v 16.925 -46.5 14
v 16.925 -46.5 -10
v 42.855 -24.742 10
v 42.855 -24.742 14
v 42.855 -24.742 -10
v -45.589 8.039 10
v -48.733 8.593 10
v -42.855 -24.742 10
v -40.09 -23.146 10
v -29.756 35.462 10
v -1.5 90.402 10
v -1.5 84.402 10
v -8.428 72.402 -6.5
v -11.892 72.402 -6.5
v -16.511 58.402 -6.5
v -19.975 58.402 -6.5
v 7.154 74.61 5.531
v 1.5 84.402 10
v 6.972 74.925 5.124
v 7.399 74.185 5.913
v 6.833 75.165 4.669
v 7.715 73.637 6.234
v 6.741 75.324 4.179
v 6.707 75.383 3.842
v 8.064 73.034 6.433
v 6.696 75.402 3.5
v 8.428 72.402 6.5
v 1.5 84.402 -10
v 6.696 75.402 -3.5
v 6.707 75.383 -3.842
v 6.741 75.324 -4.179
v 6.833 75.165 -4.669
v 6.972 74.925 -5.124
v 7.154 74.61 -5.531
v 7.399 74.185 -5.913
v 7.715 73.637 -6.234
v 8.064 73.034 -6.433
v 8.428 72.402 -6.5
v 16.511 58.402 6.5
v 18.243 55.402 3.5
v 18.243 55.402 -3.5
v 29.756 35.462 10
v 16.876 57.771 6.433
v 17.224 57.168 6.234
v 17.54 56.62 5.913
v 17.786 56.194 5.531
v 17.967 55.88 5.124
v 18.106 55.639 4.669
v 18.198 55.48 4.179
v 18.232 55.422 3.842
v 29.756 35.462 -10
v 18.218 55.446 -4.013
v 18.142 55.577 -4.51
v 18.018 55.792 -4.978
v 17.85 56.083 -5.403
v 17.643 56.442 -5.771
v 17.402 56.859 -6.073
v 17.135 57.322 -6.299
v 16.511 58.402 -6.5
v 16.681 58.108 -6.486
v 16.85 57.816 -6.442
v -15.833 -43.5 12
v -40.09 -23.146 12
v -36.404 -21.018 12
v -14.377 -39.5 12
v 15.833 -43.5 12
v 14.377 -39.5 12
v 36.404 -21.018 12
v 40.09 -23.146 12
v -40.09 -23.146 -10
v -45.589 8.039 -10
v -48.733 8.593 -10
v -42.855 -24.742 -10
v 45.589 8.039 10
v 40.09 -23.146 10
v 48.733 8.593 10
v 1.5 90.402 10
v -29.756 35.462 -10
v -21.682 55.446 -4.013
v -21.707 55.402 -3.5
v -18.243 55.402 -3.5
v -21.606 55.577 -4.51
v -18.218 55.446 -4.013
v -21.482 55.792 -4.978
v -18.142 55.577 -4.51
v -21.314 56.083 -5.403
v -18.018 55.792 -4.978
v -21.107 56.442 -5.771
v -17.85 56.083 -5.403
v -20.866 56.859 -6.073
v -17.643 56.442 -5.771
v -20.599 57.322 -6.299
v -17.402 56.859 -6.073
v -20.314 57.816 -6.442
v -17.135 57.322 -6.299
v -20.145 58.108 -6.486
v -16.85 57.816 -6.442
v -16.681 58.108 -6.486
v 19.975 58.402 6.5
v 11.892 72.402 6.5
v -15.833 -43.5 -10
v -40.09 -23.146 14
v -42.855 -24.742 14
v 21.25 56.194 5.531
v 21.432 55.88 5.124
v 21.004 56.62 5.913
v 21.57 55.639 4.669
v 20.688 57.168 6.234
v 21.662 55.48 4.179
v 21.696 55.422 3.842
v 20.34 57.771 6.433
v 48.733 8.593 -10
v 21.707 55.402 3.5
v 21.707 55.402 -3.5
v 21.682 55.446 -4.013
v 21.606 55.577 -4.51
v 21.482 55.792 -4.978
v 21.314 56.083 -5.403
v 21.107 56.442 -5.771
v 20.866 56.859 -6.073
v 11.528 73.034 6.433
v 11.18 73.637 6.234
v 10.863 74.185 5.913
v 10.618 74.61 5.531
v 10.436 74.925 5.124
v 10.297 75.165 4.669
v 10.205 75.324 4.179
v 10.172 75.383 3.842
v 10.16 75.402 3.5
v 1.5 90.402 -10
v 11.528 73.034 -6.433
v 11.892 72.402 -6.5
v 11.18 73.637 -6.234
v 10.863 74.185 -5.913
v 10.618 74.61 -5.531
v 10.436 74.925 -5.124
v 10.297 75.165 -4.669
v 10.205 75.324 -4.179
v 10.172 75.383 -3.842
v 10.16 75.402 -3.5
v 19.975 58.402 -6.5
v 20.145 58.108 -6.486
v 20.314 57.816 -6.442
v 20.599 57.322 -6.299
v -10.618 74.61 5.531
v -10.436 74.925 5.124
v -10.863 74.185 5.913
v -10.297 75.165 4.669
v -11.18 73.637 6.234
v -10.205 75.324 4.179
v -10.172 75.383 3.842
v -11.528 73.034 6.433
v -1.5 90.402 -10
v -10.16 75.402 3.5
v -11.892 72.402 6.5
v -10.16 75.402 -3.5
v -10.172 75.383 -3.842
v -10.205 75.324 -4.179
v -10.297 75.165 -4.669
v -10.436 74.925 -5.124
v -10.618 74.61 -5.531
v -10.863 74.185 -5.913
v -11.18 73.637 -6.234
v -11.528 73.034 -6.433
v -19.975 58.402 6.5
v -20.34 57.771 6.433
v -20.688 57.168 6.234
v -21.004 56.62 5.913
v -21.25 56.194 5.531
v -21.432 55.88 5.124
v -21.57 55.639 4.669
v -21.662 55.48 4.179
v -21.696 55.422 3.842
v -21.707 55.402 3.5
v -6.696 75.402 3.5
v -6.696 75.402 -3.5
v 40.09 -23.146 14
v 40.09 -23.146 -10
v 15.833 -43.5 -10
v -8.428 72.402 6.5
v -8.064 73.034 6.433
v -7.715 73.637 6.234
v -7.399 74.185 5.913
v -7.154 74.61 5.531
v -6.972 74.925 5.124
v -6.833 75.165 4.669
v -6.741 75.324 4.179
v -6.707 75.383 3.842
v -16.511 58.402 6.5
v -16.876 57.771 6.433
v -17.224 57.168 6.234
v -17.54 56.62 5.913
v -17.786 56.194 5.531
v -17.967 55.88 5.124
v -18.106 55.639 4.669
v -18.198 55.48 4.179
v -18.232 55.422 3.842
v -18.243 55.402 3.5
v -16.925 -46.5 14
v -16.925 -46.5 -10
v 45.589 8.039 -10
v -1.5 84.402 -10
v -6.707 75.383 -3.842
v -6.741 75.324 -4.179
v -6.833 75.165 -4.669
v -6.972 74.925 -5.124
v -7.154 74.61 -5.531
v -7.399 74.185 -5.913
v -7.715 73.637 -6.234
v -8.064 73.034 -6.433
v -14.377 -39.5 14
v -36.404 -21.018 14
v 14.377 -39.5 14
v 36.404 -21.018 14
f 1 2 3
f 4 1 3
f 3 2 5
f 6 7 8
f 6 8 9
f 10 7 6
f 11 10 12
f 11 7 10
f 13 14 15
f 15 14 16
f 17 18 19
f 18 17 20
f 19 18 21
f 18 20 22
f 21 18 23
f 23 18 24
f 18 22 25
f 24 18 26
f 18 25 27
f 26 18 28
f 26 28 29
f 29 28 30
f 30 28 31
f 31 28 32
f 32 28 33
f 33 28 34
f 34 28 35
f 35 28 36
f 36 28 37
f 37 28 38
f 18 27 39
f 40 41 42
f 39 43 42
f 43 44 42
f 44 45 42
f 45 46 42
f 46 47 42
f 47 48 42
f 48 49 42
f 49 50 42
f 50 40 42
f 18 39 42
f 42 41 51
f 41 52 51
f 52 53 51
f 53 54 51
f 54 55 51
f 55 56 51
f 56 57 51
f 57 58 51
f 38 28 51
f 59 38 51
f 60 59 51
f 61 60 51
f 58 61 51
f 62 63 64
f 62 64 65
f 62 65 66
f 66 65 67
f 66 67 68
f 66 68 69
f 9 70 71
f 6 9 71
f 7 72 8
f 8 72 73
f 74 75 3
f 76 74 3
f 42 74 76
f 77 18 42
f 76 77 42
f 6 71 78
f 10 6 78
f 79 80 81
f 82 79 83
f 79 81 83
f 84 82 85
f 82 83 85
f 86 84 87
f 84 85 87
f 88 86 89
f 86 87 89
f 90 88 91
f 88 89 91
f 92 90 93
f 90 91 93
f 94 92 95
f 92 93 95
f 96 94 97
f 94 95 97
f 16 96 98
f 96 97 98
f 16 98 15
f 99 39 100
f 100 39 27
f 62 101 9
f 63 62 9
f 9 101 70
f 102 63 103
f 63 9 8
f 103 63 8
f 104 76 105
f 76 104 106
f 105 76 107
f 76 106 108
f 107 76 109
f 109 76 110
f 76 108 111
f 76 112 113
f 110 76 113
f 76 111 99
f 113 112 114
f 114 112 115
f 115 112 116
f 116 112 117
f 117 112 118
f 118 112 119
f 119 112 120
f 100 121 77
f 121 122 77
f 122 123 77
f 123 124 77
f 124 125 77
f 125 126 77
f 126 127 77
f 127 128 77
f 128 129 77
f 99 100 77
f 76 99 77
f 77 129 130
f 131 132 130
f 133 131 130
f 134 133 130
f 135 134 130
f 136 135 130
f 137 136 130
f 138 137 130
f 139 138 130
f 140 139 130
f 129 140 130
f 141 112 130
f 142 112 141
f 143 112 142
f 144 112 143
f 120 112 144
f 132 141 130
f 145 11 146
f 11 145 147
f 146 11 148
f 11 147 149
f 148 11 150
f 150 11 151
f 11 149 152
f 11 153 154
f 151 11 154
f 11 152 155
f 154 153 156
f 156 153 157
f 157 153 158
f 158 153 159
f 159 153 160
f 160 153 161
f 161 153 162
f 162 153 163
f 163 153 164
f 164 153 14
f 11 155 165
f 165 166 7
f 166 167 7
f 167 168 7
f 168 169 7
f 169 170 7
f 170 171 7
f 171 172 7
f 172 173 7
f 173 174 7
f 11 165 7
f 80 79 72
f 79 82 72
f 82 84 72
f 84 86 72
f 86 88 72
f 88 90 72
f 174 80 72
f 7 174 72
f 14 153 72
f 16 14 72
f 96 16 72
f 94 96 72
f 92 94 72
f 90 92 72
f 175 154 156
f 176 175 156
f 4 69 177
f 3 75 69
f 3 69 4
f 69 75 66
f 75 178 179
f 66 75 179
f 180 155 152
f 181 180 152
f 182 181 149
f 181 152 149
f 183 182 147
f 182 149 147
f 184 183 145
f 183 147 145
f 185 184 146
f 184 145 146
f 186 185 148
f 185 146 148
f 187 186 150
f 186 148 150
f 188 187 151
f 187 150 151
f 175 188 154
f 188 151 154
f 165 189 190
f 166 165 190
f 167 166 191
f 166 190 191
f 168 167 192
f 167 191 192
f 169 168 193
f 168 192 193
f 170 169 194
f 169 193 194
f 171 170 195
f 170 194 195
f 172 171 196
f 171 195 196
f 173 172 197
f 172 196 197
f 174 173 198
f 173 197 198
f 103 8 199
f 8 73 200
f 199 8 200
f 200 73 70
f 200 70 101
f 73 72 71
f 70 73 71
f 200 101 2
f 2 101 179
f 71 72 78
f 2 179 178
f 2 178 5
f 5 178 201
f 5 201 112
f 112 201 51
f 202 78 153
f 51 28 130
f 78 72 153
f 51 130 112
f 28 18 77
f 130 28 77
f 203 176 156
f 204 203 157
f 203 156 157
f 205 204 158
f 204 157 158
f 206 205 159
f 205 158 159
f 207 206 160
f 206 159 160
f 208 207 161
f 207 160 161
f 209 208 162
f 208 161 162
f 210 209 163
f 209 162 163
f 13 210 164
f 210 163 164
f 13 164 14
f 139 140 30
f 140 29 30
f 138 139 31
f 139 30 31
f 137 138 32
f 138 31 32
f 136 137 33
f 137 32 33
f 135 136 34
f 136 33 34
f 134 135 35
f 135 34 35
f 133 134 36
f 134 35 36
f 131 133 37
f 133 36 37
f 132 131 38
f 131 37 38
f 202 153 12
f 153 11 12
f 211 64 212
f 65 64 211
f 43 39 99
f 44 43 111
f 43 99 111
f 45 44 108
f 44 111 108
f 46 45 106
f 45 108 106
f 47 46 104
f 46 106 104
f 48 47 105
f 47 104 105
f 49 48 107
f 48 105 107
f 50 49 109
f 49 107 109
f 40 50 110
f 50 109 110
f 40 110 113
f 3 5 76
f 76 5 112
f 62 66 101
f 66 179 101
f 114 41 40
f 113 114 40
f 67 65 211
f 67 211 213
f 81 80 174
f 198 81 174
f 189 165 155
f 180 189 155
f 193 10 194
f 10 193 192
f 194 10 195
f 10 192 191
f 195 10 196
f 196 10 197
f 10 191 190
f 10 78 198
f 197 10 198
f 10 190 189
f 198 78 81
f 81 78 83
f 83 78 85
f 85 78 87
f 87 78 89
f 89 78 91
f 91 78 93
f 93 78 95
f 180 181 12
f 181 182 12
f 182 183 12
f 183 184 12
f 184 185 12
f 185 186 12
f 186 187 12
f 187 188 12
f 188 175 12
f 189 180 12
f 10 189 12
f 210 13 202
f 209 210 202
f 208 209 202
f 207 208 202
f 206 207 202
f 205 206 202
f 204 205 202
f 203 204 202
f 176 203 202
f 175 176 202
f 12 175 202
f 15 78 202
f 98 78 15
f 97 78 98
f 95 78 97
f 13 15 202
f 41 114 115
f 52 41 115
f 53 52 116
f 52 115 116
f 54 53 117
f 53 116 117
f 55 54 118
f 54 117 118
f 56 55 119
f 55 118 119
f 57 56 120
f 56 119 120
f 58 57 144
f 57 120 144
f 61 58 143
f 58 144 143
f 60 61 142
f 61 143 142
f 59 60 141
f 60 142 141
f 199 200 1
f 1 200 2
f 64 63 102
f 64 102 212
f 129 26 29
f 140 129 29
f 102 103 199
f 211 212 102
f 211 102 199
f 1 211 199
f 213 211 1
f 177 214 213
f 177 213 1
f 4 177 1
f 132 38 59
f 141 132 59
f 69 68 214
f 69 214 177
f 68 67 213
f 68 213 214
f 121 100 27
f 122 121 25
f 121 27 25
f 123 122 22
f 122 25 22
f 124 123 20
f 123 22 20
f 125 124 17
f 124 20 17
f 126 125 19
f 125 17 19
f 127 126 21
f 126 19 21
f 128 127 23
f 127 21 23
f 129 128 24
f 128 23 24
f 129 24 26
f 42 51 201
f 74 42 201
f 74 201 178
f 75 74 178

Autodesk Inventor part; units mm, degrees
ref_plane "YZ Plane" through (0, 0, 0) normal (1, 0, 0) x (0, 1, 0)
ref_plane "XZ Plane" through (0, 0, 0) normal (0, 1, 0) x (-1, 0, 0)
ref_plane "XY Plane" through (0, 0, 0) normal (0, 0, 1) x (1, 0, 0)
sketch "Sketch1" plane through (0, 0, 0) normal (0, 0, 1) x (1, 0, 0)
  line L0 (29.7558, 35.4616) -> (45.5886, 8.0385)
  line L1 (45.5886, 8.0385) -> (40.0899, -23.1459)
  line L2 (40.0899, -23.1459) -> (15.8328, -43.5001)
  line L3 (15.8328, -43.5001) -> (-15.8328, -43.5001)
  line L4 (-15.8328, -43.5001) -> (-40.0899, -23.1459)
  line L5 (-40.0899, -23.1459) -> (-45.5886, 8.0385)
  line L6 (-45.5886, 8.0385) -> (-29.7558, 35.4616)
  line L7 (-29.7558, 35.4616) -> (0, 46.2919)
  line L8 (0, 46.2919) -> (29.7558, 35.4616)
  line L9 (-29.7558, 35.4616) -> (0, 87.0003)
  line L10 (0, 87.0003) -> (29.7558, 35.4616)
  line L11 (0, 93.0003) -> (-48.7326, 8.5929)
  line L12 (-48.7326, 8.5929) -> (-42.8548, -24.7422)
  line L13 (-42.8548, -24.7422) -> (-16.9247, -46.5001)
  line L14 (-16.9247, -46.5001) -> (16.9247, -46.5001)
  line L15 (16.9247, -46.5001) -> (42.8548, -24.7422)
  line L16 (42.8548, -24.7422) -> (48.7326, 8.5929)
  line L17 (48.7326, 8.5929) -> (0, 93.0003)
  line L18 (0, -74.4002) -> (0, 120.9003) projected
  point P0 (0, 0)
  point P1 (0, 0)
  dimension "d0" = 89.792
  dimension "d1" = 3
  dimension "d2" = 3
  dimension "d3" = 3
  dimension "d4" = 3
extrude "Extrusion1" add sketch "Sketch1" along normal mid plane 20 contours L10 L18 L17 L16 L15 L14 L3 L2 L1 L0 | L9 L6 L5 L4 L3 L18 L14 L13 L12 L11
sketch "Sketch2" plane through (0, 0, 10) normal (0, 0, 1) x (1, 0, 0)
  line L0 (-1.5, 90.4022) -> (-1.5, 84.4022)
  line L1 (0, 87.0003) -> (-45.5886, 8.0385) projected
  line L2 (45.5886, 8.0385) -> (0, 87.0003) projected
  line L3 (1.5, 84.4022) -> (1.5, 90.4022)
  line L4 (48.7326, 8.5929) -> (0, 93.0003) projected
  line L5 (16.9247, -46.5001) -> (42.8548, -24.7422) projected
  line L6 (42.8548, -24.7422) -> (48.7326, 8.5929) projected
  line L7 (48.7326, 8.5929) -> (0, 93.0003) projected
  line L8 (0, 93.0003) -> (-48.7326, 8.5929) projected
  line L9 (-48.7326, 8.5929) -> (-42.8548, -24.7422) projected
  line L10 (-42.8548, -24.7422) -> (-16.9247, -46.5001) projected
  line L11 (-16.9247, -46.5001) -> (16.9247, -46.5001) projected
  line L12 (15.8328, -43.5001) -> (-15.8328, -43.5001) projected
  line L13 (-15.8328, -43.5001) -> (-40.0899, -23.1459) projected
  line L14 (-40.0899, -23.1459) -> (-45.5886, 8.0385) projected
  line L15 (-45.5886, 8.0385) -> (0, 87.0003) projected
  line L16 (0, 87.0003) -> (45.5886, 8.0385) projected
  line L17 (45.5886, 8.0385) -> (40.0899, -23.1459) projected
  line L18 (40.0899, -23.1459) -> (15.8328, -43.5001) projected
  line L19 (0, -74.4002) -> (0, 120.9003) projected
  point P0 (0, 0)
  dimension "d7" = 3
extrude "Extrusion2" cut sketch "Sketch2" against normal through all contours L8 L19 L1 L0 | L4 L3 L2 L19
sketch "Sketch3" plane through (0, 0, 0) normal (1, 0, 0) x (0, 1, 0)
  line L0 (90.4022, -10) -> (90.4022, 10) projected
  line L1 (8.5929, 10) -> (90.4022, 10) projected
  line L2 (8.5929, -10) -> (8.5929, 10) projected
  line L3 (90.4022, -10) -> (8.5929, -10) projected
  line L4 (55.4022, 6.5) -> (75.4022, 6.5)
  line L5 (75.4022, 6.5) -> (75.4022, -6.5)
  line L6 (75.4022, -6.5) -> (55.4022, -6.5)
  line L7 (55.4022, -6.5) -> (55.4022, 6.5)
  line L8 (55.4022, 6.5) -> (75.4022, -6.5) construction
  line L9 (75.4022, 6.5) -> (55.4022, -6.5) construction
  point P0 (0, 0)
  point P1 (65.4022, 0)
  point P2 (90.4022, 0)
  dimension "d10" = 13
  dimension "d11" = 15
  dimension "d12" = 20
extrude "Extrusion3" cut sketch "Sketch3" along normal through all both and the other way through all contours L4 L5 L6 L7
fillet "Fillet1" radius 3 8 edges at (8.4282, 75.4022, 6.5) (19.9752, 55.4022, 6.5) (19.9752, 55.4022, -6.5) (8.4282, 75.4022, -6.5) (-8.4282, 75.4022, -6.5) (-8.4282, 75.4022, 6.5) (-19.9752, 55.4022, 6.5) (-19.9752, 55.4022, -6.5)
sketch "Sketch5" plane through (0, 0, 10) normal (0, 0, 1) x (1, 0, 0)
  line L0 (1.5, 90.4022) -> (1.5, 84.4022) projected
  line L1 (1.5, 84.4022) -> (45.5886, 8.0385) projected
  line L2 (45.5886, 8.0385) -> (40.0899, -23.1459) projected
  line L3 (40.0899, -23.1459) -> (15.8328, -43.5001) projected
  line L4 (15.8328, -43.5001) -> (-15.8328, -43.5001) projected
  line L5 (-15.8328, -43.5001) -> (-40.0899, -23.1459) projected
  line L6 (-40.0899, -23.1459) -> (-45.5886, 8.0385) projected
  line L7 (-45.5886, 8.0385) -> (-1.5, 84.4022) projected
  line L8 (-1.5, 84.4022) -> (-1.5, 90.4022) projected
  line L9 (-1.5, 90.4022) -> (-48.7326, 8.5929) projected
  line L10 (-48.7326, 8.5929) -> (-42.8548, -24.7422) projected
  line L11 (-42.8548, -24.7422) -> (-16.9247, -46.5001) projected
  line L12 (-16.9247, -46.5001) -> (16.9247, -46.5001) projected
  line L13 (16.9247, -46.5001) -> (42.8548, -24.7422) projected
  line L14 (42.8548, -24.7422) -> (48.7326, 8.5929) projected
  line L15 (48.7326, 8.5929) -> (1.5, 90.4022) projected
  line L16 (-40.0899, -23.1459) -> (-42.8548, -24.7422)
  line L17 (40.0899, -23.1459) -> (45.5886, 8.0385) projected
  line L18 (40.0899, -23.1459) -> (42.8548, -24.7422)
  point P0 (0, 0)
extrude "Extrusion5" add sketch "Sketch5" along normal blind 2 contours L13 L12 L11 L16 L5 L4 L3 L18
sketch "Sketch6" plane through (0, 0, 12) normal (0, 0, 1) x (1, 0, 0)
  line L0 (15.8328, -43.5001) -> (-15.8328, -43.5001) projected
  line L1 (-15.8328, -43.5001) -> (-40.0899, -23.1459) projected
  line L2 (-40.0899, -23.1459) -> (-42.8548, -24.7422) projected
  line L3 (-42.8548, -24.7422) -> (-16.9247, -46.5001) projected
  line L4 (-16.9247, -46.5001) -> (16.9247, -46.5001) projected
  line L5 (16.9247, -46.5001) -> (42.8548, -24.7422) projected
  line L6 (42.8548, -24.7422) -> (40.0899, -23.1459) projected
  line L7 (40.0899, -23.1459) -> (15.8328, -43.5001) projected
  line L8 (-42.8548, -24.7422) -> (-36.4035, -21.0176)
  line L9 (-36.4035, -21.0176) -> (-14.3769, -39.5001)
  line L10 (-14.3769, -39.5001) -> (14.3769, -39.5001)
  line L11 (14.3769, -39.5001) -> (36.4035, -21.0176)
  line L12 (36.4035, -21.0176) -> (42.8548, -24.7422)
  line L13 (-40.0899, -23.1459) -> (-42.8548, -24.7422) projected
  line L14 (0, -73.8806) -> (0, 117.7826) projected
  point P0 (0, 0)
  dimension "d21" = 4
  dimension "d22" = 4
extrude "Extrusion6" add sketch "Sketch6" along normal blind 2
properties part number "HARNESS"
